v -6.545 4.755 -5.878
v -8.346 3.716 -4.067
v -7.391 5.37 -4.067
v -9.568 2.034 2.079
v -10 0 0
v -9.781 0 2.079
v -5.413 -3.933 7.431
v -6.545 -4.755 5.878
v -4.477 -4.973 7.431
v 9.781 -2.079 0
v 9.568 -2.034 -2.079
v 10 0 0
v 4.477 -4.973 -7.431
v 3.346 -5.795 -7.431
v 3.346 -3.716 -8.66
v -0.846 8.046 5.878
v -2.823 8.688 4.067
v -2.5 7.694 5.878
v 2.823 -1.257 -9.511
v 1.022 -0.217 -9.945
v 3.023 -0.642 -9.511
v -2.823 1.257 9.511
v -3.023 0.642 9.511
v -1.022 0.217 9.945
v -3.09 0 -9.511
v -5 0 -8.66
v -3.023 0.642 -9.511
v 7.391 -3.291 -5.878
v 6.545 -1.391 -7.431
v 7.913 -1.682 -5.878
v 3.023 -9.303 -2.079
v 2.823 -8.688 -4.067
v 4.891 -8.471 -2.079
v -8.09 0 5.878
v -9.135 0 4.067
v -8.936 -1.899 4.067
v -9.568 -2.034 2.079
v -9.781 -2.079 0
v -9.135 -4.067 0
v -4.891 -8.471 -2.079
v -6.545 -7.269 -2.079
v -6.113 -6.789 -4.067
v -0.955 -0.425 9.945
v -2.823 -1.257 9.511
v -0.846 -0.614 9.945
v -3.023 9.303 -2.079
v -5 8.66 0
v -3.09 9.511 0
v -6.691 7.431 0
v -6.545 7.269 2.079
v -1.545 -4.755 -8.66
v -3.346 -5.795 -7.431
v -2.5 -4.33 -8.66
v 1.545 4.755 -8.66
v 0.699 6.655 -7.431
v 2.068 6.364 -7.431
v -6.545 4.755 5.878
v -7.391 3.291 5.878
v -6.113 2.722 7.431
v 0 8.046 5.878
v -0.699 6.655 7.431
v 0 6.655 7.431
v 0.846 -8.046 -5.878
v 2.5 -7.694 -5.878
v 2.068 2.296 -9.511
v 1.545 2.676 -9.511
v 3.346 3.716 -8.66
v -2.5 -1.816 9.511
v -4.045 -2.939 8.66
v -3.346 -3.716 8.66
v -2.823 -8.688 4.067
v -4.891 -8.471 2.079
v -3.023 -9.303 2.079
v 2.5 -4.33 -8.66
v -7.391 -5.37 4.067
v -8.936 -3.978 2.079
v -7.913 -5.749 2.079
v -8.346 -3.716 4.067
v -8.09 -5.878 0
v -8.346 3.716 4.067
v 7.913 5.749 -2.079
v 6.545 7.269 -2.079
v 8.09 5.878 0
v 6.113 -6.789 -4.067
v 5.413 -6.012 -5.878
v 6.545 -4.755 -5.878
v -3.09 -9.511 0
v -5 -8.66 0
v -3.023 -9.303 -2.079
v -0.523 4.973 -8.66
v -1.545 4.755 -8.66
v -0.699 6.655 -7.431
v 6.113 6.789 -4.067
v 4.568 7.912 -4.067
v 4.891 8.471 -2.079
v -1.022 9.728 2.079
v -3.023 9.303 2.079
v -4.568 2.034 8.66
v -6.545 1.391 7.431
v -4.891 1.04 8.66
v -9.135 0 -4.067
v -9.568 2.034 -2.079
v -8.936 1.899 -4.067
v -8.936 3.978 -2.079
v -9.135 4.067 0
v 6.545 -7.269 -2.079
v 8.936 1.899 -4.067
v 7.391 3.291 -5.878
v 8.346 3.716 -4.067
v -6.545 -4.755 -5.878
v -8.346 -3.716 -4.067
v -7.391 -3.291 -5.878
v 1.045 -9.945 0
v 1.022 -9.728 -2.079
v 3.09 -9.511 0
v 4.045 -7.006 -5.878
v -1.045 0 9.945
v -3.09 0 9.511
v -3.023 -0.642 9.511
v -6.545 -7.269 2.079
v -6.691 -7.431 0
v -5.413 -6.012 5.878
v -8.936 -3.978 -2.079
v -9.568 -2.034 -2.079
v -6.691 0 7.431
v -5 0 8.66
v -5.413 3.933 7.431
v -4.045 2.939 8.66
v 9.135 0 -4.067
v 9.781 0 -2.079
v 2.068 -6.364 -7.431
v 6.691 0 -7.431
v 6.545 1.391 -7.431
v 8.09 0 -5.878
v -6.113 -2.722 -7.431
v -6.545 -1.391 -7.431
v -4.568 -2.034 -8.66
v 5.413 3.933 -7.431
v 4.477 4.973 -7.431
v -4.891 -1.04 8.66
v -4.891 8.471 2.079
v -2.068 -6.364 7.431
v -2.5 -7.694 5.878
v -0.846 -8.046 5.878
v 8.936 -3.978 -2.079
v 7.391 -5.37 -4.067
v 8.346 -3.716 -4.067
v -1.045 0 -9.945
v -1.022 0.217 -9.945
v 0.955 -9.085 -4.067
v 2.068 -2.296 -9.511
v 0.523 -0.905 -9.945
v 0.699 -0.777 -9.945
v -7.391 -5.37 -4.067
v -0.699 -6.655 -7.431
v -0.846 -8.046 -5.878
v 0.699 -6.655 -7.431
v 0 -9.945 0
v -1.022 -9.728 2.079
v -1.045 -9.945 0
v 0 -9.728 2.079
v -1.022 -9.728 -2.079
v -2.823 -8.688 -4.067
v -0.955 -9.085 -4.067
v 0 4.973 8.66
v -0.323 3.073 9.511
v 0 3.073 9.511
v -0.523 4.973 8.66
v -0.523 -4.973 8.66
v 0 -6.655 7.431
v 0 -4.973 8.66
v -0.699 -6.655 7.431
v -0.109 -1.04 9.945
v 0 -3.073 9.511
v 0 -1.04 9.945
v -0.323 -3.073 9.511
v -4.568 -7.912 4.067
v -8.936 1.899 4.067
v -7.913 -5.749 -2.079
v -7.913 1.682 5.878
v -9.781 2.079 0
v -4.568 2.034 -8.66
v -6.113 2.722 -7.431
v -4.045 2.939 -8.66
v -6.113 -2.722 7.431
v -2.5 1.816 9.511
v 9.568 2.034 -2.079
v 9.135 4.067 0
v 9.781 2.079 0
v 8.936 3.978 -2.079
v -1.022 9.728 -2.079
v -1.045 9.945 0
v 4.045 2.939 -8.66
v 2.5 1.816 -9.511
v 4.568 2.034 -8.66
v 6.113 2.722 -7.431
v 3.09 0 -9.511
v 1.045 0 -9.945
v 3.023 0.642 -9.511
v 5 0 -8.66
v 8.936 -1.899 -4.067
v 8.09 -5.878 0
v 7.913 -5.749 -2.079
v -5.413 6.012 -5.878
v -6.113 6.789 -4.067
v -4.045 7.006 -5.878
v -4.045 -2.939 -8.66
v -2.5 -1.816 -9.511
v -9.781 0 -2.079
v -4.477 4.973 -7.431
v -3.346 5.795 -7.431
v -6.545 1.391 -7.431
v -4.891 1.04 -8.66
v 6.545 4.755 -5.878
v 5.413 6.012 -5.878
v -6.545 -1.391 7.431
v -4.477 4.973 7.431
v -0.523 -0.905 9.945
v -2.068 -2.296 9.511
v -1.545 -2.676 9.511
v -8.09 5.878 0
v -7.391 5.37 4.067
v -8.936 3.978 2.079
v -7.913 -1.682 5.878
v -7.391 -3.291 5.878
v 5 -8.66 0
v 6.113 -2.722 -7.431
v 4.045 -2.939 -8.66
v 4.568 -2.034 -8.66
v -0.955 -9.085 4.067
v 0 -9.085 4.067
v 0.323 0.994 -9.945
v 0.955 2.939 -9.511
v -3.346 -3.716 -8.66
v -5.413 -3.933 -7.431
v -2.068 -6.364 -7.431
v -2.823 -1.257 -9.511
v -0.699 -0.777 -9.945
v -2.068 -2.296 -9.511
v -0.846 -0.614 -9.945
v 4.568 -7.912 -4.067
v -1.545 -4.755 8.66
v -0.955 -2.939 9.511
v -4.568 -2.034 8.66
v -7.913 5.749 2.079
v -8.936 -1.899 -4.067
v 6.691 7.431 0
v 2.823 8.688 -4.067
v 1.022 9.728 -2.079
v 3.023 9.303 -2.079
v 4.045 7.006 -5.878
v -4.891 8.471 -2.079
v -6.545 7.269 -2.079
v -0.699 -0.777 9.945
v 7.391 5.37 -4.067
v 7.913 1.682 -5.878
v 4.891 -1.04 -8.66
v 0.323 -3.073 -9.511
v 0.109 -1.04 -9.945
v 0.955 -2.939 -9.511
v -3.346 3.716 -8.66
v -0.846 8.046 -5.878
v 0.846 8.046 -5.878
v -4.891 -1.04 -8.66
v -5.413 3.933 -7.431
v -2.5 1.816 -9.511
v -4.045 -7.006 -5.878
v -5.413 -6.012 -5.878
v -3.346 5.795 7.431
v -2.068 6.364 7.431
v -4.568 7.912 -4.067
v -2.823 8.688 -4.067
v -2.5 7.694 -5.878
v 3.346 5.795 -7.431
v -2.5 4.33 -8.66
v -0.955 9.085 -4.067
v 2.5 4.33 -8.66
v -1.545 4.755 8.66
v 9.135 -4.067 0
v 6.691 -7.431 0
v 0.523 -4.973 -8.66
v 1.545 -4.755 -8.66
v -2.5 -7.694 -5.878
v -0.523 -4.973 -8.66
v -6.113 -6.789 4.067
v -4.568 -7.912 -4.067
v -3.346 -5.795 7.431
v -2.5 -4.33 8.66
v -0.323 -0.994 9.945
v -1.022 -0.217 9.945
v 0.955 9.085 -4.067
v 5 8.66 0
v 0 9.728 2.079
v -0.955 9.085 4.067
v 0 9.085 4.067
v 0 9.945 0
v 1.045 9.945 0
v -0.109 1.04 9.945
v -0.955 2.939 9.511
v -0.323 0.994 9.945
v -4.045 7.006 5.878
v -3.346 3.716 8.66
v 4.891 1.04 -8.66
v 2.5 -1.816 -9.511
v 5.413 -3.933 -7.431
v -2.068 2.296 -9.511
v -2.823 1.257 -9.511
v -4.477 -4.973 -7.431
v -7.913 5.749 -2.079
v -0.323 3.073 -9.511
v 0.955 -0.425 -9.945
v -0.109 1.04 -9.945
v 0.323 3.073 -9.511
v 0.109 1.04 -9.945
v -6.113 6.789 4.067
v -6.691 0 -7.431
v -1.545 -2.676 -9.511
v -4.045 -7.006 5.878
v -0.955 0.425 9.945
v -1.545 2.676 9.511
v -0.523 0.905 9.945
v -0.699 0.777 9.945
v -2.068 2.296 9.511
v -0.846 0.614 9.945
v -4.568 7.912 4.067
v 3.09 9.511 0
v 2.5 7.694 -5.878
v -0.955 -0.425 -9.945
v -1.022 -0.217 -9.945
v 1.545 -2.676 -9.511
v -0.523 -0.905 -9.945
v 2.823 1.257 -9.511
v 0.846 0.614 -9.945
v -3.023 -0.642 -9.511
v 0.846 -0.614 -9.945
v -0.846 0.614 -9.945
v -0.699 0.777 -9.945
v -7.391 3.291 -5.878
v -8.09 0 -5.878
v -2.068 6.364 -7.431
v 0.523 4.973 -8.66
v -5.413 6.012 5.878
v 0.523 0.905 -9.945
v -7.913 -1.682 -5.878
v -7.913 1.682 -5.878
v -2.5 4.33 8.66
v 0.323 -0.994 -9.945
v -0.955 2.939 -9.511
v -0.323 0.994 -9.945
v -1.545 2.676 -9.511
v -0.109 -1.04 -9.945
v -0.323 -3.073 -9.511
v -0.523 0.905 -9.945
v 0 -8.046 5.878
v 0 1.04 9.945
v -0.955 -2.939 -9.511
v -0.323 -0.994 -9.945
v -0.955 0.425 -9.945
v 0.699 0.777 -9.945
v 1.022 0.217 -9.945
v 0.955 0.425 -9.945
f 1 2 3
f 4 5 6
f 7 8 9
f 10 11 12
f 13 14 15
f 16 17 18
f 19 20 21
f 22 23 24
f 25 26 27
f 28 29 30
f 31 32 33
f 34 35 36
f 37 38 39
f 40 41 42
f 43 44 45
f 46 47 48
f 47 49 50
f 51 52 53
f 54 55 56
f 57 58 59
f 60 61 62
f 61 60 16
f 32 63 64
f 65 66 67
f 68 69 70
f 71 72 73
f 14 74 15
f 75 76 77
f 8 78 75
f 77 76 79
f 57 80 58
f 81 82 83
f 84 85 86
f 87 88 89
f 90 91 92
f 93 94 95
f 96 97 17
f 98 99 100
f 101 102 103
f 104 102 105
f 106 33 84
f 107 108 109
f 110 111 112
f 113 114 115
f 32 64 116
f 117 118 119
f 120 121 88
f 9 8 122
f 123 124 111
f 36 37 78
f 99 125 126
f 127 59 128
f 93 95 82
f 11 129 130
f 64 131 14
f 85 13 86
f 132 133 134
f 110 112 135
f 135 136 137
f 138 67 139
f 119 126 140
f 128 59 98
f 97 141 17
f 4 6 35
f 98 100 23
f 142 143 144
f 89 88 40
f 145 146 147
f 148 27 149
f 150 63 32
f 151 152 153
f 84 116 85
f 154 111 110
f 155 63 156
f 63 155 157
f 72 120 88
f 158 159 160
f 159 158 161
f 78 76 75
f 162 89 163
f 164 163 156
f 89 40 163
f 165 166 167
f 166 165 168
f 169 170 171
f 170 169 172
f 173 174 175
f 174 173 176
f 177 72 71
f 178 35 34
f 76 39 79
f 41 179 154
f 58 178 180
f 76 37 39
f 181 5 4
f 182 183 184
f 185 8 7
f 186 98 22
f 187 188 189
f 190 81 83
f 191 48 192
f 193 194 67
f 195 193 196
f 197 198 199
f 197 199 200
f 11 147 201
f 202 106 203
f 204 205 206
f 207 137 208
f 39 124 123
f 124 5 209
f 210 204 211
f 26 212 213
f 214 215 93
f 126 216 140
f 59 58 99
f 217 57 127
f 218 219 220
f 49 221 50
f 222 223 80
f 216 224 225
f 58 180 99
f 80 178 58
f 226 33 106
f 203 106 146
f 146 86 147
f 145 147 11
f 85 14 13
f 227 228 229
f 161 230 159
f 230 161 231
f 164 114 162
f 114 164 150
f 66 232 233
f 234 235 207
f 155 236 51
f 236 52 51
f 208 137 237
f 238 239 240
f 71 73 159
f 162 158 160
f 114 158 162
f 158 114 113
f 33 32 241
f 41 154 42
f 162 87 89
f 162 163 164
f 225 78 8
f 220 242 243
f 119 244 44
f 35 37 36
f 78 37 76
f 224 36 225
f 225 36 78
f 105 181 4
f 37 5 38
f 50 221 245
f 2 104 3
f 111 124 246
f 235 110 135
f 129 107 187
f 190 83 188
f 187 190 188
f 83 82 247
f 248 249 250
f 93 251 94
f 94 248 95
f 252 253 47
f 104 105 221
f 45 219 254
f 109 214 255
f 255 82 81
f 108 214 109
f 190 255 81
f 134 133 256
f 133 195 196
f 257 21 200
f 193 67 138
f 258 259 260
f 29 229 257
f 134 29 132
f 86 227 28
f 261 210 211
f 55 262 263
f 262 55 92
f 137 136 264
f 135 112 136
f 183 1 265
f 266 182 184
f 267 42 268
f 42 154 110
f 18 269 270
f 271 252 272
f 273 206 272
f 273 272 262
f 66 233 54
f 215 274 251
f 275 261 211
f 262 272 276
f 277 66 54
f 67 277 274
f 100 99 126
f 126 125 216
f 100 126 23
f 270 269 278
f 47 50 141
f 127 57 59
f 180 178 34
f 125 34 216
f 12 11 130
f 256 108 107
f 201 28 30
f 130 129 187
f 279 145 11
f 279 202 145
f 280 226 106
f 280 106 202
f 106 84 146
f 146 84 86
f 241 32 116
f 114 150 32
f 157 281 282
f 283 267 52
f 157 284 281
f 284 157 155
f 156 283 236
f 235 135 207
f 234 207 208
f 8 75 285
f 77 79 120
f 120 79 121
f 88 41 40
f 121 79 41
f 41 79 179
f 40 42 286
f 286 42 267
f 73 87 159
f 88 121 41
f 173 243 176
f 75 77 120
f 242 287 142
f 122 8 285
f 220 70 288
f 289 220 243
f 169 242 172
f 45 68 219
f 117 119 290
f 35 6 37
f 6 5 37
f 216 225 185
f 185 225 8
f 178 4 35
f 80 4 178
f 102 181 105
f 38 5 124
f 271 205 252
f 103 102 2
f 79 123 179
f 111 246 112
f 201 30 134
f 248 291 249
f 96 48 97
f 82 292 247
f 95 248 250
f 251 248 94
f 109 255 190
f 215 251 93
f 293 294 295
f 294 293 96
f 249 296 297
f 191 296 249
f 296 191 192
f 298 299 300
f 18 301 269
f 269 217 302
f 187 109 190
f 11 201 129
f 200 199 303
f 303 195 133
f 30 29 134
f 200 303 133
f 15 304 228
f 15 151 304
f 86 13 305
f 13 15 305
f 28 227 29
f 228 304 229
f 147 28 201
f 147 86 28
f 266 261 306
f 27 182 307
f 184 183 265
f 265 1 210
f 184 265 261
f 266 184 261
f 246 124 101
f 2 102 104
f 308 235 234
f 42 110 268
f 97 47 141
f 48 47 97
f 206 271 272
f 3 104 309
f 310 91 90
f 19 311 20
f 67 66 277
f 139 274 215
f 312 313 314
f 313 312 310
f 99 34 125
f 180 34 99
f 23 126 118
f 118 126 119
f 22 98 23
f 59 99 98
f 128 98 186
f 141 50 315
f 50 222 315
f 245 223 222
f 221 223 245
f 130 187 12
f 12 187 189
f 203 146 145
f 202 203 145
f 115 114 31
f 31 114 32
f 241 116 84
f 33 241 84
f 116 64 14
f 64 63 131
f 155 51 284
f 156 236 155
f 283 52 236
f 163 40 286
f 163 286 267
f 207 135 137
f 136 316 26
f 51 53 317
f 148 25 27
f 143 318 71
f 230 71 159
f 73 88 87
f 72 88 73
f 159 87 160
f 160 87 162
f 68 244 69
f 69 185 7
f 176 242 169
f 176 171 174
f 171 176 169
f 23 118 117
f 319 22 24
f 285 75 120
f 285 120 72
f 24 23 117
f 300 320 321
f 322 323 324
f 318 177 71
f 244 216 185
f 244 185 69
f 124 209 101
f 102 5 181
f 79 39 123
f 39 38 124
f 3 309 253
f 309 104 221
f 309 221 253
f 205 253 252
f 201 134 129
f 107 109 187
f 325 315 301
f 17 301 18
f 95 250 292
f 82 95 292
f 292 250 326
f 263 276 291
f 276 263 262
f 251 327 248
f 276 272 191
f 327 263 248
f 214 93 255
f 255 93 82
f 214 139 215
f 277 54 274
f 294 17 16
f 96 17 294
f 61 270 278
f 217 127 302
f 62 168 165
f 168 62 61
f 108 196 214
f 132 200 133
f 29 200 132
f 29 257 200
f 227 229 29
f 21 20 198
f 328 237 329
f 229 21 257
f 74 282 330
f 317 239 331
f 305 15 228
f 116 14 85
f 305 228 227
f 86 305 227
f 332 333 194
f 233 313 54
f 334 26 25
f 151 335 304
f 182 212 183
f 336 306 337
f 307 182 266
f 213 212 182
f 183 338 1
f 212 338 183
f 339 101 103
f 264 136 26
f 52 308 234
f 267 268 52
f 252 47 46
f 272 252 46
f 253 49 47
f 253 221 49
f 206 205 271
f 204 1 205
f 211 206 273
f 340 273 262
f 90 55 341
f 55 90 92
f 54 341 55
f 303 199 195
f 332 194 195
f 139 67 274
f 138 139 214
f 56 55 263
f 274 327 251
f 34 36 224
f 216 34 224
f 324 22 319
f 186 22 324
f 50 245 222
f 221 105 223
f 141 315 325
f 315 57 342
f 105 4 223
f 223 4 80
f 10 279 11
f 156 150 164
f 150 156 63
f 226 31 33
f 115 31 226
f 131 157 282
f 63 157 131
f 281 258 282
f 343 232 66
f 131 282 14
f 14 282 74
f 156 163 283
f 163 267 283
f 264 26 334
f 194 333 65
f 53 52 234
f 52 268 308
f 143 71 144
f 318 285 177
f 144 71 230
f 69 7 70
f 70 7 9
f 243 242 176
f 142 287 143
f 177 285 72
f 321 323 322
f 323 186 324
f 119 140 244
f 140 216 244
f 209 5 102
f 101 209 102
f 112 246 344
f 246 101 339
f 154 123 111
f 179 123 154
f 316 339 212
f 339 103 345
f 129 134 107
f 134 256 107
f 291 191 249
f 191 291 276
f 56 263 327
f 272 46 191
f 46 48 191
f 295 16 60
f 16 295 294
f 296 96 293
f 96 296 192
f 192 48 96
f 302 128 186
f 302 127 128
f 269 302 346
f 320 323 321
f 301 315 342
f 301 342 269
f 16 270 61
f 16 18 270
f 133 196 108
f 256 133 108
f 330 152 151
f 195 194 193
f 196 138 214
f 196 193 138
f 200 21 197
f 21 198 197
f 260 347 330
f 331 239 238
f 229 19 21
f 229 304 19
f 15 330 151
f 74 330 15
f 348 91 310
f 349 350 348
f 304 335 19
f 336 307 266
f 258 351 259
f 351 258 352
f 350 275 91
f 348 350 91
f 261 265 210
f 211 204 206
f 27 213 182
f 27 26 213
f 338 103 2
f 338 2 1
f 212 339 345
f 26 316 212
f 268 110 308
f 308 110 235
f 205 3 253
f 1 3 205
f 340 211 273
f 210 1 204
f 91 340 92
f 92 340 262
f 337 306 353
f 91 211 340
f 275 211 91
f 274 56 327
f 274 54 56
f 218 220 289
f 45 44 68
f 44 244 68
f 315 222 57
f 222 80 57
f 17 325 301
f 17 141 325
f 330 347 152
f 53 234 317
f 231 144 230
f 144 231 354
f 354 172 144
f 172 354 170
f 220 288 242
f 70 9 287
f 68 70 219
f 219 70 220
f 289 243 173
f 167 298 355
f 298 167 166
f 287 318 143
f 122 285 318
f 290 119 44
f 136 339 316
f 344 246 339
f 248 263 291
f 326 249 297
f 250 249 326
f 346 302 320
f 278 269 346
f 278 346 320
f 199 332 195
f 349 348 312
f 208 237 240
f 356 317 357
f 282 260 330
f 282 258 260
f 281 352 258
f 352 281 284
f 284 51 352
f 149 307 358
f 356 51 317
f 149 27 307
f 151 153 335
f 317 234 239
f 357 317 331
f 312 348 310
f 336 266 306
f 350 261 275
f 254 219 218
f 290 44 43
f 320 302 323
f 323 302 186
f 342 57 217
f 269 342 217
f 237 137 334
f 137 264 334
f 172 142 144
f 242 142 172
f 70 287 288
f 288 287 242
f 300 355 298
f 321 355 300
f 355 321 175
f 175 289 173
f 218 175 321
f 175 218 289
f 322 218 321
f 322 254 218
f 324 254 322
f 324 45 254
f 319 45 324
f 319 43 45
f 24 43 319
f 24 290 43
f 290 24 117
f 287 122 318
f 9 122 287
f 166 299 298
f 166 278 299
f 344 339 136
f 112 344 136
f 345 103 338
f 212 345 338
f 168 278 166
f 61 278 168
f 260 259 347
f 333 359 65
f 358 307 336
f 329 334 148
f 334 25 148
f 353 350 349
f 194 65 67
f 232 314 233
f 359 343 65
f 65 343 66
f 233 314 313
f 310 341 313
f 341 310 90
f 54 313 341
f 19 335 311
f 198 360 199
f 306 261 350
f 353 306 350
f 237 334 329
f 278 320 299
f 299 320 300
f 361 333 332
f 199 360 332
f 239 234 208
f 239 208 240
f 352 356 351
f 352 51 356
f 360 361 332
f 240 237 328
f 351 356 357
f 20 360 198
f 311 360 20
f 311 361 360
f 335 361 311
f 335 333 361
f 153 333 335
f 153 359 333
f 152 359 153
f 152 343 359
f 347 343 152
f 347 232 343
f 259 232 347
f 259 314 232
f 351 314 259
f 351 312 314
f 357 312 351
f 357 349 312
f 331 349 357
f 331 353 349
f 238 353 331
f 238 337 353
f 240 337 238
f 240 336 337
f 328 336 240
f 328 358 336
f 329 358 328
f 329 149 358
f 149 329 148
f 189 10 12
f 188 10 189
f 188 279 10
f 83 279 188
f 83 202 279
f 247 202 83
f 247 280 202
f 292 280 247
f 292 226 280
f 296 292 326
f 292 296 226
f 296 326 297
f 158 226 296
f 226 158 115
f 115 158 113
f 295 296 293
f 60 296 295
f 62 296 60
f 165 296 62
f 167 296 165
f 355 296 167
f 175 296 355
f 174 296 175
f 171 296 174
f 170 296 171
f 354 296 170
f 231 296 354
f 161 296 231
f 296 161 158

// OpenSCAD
difference() {
  sphere(10);
  translate([0,-15,0]) cube([15,30,15]);
  %color([0.5,0.5,1], alpha=0.3) translate([0,-15,0]) cube([15,30,15]);
}
